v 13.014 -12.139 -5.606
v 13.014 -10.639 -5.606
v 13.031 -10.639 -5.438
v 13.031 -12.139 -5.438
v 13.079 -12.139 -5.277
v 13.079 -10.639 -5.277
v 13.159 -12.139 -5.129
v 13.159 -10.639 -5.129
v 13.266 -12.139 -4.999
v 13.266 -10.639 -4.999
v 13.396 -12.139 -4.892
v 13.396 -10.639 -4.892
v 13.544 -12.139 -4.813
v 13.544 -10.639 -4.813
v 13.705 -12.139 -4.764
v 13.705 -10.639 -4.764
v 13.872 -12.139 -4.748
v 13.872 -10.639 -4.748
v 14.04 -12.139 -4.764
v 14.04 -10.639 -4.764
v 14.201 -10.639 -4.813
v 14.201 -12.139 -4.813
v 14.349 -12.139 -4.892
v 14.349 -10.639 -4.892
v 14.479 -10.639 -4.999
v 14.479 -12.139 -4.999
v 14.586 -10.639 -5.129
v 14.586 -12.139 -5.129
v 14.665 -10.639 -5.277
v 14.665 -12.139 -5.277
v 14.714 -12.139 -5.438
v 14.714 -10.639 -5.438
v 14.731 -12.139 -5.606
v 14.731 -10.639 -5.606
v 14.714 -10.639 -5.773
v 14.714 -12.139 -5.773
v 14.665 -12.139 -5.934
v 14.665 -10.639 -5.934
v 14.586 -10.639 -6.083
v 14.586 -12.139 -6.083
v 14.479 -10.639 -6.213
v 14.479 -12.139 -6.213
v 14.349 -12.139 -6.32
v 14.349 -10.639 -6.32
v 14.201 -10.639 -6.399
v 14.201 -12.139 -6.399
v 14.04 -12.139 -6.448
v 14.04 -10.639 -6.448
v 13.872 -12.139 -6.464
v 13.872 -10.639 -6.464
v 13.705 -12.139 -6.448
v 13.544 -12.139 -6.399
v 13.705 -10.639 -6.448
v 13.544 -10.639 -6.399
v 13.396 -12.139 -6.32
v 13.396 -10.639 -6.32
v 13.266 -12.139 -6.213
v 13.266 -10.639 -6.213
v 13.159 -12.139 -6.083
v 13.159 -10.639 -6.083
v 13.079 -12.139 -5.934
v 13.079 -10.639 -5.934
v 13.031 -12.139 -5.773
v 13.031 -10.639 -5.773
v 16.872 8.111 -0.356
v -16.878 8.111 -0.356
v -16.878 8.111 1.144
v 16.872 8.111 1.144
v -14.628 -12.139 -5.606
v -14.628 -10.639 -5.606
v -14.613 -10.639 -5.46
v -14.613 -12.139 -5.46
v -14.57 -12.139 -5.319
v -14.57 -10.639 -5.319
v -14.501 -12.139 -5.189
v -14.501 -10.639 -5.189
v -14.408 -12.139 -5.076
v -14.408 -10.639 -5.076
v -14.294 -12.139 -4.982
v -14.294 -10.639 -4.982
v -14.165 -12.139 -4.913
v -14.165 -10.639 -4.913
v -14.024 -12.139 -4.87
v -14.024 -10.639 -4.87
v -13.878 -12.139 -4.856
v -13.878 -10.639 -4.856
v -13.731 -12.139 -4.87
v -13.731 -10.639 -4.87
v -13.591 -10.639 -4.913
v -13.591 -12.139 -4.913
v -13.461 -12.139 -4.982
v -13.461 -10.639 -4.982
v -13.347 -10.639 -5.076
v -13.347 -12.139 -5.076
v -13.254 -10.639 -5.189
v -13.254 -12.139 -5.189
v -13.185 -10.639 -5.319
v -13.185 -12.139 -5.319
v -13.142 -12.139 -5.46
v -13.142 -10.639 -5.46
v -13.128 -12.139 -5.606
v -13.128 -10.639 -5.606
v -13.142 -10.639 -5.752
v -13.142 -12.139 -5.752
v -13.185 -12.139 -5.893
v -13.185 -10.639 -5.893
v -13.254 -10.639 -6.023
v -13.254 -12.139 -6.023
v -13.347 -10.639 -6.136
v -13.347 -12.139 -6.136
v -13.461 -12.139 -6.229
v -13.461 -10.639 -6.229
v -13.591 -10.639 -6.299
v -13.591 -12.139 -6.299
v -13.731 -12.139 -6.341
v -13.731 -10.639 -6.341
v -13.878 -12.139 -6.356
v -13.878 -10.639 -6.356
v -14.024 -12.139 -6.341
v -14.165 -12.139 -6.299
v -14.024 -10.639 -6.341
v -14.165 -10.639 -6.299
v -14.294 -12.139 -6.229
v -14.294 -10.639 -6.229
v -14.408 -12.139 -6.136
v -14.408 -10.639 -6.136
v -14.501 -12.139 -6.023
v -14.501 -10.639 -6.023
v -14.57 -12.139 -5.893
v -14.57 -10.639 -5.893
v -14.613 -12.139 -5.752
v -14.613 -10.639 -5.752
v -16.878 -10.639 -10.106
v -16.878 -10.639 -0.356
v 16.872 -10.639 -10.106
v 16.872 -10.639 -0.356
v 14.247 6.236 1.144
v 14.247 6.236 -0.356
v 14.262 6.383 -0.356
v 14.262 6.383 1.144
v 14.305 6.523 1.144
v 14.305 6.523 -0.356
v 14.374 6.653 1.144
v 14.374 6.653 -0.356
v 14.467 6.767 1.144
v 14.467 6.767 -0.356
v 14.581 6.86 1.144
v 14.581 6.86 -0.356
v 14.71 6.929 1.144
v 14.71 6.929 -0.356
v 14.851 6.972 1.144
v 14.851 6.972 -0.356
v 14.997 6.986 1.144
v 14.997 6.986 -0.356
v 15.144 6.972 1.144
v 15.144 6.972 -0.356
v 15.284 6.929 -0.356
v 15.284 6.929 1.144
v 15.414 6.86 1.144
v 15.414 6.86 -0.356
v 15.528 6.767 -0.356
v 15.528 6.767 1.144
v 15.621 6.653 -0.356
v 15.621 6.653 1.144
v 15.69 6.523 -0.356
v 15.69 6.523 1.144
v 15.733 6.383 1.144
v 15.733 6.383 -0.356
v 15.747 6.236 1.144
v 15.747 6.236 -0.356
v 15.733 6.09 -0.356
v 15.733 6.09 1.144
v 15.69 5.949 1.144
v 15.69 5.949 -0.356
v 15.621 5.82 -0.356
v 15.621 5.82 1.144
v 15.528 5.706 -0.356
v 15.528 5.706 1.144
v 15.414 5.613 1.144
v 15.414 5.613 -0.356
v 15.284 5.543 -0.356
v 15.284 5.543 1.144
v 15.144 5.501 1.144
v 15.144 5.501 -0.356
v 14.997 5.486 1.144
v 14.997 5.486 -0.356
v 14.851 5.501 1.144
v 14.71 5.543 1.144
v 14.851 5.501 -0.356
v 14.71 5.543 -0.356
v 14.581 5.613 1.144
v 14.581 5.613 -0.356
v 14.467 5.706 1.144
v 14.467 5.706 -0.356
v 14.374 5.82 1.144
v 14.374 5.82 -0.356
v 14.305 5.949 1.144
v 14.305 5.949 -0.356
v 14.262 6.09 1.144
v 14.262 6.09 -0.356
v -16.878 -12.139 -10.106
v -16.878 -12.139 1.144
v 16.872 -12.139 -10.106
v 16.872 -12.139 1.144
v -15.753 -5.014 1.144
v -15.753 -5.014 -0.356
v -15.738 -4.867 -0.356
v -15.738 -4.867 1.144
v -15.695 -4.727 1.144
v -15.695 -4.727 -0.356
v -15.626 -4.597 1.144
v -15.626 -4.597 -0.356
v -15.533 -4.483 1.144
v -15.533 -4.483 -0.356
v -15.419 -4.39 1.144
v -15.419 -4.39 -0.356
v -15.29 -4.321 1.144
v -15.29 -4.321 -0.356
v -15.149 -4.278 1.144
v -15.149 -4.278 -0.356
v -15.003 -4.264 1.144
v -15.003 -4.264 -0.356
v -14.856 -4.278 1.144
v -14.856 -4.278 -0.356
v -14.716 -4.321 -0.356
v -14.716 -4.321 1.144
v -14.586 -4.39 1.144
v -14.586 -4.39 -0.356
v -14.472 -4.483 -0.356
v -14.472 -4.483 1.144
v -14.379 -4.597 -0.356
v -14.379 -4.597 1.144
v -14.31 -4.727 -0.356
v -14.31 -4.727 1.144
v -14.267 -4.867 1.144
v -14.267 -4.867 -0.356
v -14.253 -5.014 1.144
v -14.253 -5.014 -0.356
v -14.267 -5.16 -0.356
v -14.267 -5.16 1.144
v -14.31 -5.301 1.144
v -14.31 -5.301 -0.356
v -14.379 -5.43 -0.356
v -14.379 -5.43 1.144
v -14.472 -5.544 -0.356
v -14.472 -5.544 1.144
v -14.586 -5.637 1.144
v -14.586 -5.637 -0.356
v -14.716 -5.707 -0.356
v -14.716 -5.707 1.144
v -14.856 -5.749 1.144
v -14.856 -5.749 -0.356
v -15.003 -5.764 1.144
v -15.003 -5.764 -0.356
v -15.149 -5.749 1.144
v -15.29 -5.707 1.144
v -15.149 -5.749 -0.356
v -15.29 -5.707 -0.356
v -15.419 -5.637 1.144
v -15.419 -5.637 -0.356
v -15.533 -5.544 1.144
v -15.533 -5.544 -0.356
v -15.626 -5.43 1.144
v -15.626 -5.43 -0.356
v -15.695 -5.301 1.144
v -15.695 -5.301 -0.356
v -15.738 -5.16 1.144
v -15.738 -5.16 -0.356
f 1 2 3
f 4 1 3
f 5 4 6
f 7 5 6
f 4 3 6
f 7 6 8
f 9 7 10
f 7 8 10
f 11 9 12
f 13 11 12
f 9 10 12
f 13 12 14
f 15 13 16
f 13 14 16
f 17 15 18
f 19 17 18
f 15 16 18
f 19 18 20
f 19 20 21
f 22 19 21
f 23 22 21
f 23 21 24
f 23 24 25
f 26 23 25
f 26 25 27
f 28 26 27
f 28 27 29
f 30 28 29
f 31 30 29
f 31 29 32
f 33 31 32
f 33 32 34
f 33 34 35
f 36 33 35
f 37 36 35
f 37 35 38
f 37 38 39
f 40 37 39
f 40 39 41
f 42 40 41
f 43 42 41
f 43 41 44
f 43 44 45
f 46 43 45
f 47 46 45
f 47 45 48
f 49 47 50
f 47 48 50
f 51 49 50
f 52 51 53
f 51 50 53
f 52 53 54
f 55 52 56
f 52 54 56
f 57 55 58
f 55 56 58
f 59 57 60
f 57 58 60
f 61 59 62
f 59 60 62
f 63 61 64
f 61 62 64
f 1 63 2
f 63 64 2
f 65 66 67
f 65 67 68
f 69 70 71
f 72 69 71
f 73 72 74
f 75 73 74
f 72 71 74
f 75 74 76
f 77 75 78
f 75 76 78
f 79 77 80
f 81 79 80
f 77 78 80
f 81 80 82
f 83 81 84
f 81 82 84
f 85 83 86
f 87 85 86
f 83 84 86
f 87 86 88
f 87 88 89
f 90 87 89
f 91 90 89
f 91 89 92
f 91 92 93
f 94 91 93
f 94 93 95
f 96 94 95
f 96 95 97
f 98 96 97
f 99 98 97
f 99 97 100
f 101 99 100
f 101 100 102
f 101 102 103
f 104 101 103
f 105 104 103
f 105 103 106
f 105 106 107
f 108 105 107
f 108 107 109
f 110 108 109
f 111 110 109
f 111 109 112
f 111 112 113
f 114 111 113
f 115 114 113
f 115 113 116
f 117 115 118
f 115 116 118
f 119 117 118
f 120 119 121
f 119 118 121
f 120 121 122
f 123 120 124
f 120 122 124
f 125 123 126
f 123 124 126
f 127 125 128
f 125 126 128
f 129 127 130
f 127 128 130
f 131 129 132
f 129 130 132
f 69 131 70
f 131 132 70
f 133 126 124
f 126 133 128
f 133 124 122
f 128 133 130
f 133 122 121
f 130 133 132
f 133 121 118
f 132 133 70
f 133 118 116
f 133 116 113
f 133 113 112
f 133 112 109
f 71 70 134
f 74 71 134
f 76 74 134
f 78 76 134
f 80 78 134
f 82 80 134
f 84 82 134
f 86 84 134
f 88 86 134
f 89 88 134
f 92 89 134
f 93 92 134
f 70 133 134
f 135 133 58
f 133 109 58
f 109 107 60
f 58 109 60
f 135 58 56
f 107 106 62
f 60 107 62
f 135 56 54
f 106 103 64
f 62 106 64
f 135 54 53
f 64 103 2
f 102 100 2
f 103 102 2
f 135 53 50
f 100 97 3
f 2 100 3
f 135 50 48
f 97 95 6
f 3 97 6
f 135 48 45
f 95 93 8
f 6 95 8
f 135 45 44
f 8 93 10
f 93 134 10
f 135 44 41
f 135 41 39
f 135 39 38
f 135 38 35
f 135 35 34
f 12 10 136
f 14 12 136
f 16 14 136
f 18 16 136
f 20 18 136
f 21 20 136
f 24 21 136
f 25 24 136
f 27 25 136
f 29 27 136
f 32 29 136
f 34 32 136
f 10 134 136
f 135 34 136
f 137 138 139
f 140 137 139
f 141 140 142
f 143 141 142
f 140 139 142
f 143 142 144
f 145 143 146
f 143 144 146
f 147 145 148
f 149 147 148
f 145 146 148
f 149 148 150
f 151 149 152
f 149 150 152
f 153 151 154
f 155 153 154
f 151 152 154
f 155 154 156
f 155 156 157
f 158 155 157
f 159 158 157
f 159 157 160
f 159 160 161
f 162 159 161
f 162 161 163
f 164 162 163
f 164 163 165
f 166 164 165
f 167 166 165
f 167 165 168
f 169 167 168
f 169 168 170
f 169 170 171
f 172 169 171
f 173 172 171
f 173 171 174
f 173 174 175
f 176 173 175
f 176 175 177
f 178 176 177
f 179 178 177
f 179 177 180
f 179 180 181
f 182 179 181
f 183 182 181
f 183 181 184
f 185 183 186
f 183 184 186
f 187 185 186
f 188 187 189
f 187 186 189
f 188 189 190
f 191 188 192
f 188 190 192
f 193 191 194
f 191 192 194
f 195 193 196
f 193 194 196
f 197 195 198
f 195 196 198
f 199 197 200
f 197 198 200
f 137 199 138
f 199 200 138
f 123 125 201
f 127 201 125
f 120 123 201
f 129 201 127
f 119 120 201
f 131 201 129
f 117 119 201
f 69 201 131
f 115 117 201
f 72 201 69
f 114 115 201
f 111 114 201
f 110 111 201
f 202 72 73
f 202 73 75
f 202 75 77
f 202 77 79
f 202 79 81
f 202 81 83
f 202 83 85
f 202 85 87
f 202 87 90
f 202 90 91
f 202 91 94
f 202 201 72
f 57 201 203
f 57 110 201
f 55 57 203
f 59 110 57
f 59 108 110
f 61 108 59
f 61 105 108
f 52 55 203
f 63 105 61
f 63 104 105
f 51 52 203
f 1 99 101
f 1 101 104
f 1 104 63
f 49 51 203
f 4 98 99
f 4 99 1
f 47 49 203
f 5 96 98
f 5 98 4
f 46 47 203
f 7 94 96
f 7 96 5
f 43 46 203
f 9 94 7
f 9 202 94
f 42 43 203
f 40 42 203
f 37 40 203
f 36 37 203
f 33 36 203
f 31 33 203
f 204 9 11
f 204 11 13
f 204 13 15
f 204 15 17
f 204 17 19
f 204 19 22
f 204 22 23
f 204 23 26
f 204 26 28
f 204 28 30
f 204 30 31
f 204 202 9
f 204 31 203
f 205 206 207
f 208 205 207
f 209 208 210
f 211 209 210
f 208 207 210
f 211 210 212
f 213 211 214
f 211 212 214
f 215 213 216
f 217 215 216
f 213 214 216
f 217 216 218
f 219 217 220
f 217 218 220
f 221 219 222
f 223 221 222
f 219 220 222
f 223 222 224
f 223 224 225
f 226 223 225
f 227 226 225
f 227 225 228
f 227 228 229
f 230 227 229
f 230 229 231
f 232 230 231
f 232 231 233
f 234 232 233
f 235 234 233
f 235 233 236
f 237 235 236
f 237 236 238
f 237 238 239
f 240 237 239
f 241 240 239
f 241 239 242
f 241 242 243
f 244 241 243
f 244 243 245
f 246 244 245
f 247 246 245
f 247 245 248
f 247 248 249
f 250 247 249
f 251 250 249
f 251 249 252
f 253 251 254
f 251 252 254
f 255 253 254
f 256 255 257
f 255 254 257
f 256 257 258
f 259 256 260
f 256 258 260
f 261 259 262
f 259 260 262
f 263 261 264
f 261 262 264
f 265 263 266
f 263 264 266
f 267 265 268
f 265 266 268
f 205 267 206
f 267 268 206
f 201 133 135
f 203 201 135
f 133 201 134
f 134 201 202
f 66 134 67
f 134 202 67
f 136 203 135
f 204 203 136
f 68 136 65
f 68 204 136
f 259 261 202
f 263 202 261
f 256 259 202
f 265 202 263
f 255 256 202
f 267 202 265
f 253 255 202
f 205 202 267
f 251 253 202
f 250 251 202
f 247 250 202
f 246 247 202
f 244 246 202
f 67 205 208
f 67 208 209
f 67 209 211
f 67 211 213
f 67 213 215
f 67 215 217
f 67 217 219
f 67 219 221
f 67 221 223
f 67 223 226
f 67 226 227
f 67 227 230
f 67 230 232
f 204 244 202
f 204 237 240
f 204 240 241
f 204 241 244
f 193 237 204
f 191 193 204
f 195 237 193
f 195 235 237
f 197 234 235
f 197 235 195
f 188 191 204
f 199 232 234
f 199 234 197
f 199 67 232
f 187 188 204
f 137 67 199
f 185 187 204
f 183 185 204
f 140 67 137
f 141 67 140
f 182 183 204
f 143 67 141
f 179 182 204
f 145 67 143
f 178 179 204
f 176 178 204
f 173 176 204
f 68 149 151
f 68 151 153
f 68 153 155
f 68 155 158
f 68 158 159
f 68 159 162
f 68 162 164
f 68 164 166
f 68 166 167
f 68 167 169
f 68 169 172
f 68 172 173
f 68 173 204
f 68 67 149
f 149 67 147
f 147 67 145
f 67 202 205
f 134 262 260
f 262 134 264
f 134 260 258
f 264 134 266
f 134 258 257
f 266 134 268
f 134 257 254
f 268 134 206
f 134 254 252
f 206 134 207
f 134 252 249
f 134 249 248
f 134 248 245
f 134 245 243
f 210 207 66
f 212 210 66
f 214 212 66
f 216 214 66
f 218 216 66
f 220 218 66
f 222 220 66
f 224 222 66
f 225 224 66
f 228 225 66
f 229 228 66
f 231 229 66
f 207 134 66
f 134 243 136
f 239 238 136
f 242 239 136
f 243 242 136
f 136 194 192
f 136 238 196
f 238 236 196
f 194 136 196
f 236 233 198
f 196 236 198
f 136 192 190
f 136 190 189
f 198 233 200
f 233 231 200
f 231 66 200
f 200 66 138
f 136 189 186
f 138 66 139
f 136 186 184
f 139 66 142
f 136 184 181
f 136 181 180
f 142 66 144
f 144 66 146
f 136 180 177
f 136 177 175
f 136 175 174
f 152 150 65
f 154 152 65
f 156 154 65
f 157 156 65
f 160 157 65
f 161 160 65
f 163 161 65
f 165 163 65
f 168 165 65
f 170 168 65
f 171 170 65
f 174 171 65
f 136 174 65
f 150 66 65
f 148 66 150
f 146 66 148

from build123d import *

# Parameters (mm, degrees)
SKETCH1_W           = 45
SKETCH1_H           = 25
SKETCH1_H_2         = 2
BOSS_EXTRUDE3_DEPTH = 2
SKETCH6_W           = 45
SKETCH6_H           = 2
BOSS_EXTRUDE4_DEPTH = 15
SKETCH7_R           = 1
CUT_EXTRUDE1_DEPTH  = 18
SKETCH9_R           = 1
SKETCH9_R_2         = 1.144474258
CUT_EXTRUDE3_DEPTH  = 18
SCALE1_SCALE        = 0.75


with BuildPart() as part:
    # Sketch1 → Boss-Extrude3 (new body)
    with BuildSketch(Plane.XY):
        Rectangle(SKETCH1_W, SKETCH1_H)
        with Locations((0, -13.5)):
            Rectangle(SKETCH1_W, SKETCH1_H_2)
    extrude(amount=BOSS_EXTRUDE3_DEPTH)

    # Sketch6 → Boss-Extrude4 (add)
    with BuildSketch(Plane.XY.offset(2)):
        with Locations((0, -13.5)):
            Rectangle(SKETCH6_W, SKETCH6_H)
    extrude(amount=-BOSS_EXTRUDE4_DEPTH)

    # Sketch7 → Cut-Extrude1 (cut)
    with BuildSketch(Plane(origin=(0, 0, 0), x_dir=(-1, 0, 0), z_dir=(0, 0, -1))):
        with Locations((-20, 10)):
            Circle(SKETCH7_R)
        with Locations((20, -5)):
            Circle(SKETCH7_R)
    extrude(amount=-CUT_EXTRUDE1_DEPTH, mode=Mode.SUBTRACT)

    # Sketch9 → Cut-Extrude3 (cut)
    with BuildSketch(Plane(origin=(0, -12.5, 0), x_dir=(1, 0, 0), z_dir=(0, 1, 0))):
        with Locations(Location((-18.5, 7, 0), (0, 0, 180))):
            Circle(SKETCH9_R)
        with Locations(Location((18.5, 7, 0), (0, 0, 180))):
            Circle(SKETCH9_R_2)
    extrude(amount=-CUT_EXTRUDE3_DEPTH, mode=Mode.SUBTRACT)


with BuildPart() as part_1:
    # Scale1: scaled about (-0.010079513, -5.05482545, -1.423478353)
    add(part.part.scale(SCALE1_SCALE).moved(Location((-0.002519878, -1.263706363, -0.355869588))))


solid = part_1.part
